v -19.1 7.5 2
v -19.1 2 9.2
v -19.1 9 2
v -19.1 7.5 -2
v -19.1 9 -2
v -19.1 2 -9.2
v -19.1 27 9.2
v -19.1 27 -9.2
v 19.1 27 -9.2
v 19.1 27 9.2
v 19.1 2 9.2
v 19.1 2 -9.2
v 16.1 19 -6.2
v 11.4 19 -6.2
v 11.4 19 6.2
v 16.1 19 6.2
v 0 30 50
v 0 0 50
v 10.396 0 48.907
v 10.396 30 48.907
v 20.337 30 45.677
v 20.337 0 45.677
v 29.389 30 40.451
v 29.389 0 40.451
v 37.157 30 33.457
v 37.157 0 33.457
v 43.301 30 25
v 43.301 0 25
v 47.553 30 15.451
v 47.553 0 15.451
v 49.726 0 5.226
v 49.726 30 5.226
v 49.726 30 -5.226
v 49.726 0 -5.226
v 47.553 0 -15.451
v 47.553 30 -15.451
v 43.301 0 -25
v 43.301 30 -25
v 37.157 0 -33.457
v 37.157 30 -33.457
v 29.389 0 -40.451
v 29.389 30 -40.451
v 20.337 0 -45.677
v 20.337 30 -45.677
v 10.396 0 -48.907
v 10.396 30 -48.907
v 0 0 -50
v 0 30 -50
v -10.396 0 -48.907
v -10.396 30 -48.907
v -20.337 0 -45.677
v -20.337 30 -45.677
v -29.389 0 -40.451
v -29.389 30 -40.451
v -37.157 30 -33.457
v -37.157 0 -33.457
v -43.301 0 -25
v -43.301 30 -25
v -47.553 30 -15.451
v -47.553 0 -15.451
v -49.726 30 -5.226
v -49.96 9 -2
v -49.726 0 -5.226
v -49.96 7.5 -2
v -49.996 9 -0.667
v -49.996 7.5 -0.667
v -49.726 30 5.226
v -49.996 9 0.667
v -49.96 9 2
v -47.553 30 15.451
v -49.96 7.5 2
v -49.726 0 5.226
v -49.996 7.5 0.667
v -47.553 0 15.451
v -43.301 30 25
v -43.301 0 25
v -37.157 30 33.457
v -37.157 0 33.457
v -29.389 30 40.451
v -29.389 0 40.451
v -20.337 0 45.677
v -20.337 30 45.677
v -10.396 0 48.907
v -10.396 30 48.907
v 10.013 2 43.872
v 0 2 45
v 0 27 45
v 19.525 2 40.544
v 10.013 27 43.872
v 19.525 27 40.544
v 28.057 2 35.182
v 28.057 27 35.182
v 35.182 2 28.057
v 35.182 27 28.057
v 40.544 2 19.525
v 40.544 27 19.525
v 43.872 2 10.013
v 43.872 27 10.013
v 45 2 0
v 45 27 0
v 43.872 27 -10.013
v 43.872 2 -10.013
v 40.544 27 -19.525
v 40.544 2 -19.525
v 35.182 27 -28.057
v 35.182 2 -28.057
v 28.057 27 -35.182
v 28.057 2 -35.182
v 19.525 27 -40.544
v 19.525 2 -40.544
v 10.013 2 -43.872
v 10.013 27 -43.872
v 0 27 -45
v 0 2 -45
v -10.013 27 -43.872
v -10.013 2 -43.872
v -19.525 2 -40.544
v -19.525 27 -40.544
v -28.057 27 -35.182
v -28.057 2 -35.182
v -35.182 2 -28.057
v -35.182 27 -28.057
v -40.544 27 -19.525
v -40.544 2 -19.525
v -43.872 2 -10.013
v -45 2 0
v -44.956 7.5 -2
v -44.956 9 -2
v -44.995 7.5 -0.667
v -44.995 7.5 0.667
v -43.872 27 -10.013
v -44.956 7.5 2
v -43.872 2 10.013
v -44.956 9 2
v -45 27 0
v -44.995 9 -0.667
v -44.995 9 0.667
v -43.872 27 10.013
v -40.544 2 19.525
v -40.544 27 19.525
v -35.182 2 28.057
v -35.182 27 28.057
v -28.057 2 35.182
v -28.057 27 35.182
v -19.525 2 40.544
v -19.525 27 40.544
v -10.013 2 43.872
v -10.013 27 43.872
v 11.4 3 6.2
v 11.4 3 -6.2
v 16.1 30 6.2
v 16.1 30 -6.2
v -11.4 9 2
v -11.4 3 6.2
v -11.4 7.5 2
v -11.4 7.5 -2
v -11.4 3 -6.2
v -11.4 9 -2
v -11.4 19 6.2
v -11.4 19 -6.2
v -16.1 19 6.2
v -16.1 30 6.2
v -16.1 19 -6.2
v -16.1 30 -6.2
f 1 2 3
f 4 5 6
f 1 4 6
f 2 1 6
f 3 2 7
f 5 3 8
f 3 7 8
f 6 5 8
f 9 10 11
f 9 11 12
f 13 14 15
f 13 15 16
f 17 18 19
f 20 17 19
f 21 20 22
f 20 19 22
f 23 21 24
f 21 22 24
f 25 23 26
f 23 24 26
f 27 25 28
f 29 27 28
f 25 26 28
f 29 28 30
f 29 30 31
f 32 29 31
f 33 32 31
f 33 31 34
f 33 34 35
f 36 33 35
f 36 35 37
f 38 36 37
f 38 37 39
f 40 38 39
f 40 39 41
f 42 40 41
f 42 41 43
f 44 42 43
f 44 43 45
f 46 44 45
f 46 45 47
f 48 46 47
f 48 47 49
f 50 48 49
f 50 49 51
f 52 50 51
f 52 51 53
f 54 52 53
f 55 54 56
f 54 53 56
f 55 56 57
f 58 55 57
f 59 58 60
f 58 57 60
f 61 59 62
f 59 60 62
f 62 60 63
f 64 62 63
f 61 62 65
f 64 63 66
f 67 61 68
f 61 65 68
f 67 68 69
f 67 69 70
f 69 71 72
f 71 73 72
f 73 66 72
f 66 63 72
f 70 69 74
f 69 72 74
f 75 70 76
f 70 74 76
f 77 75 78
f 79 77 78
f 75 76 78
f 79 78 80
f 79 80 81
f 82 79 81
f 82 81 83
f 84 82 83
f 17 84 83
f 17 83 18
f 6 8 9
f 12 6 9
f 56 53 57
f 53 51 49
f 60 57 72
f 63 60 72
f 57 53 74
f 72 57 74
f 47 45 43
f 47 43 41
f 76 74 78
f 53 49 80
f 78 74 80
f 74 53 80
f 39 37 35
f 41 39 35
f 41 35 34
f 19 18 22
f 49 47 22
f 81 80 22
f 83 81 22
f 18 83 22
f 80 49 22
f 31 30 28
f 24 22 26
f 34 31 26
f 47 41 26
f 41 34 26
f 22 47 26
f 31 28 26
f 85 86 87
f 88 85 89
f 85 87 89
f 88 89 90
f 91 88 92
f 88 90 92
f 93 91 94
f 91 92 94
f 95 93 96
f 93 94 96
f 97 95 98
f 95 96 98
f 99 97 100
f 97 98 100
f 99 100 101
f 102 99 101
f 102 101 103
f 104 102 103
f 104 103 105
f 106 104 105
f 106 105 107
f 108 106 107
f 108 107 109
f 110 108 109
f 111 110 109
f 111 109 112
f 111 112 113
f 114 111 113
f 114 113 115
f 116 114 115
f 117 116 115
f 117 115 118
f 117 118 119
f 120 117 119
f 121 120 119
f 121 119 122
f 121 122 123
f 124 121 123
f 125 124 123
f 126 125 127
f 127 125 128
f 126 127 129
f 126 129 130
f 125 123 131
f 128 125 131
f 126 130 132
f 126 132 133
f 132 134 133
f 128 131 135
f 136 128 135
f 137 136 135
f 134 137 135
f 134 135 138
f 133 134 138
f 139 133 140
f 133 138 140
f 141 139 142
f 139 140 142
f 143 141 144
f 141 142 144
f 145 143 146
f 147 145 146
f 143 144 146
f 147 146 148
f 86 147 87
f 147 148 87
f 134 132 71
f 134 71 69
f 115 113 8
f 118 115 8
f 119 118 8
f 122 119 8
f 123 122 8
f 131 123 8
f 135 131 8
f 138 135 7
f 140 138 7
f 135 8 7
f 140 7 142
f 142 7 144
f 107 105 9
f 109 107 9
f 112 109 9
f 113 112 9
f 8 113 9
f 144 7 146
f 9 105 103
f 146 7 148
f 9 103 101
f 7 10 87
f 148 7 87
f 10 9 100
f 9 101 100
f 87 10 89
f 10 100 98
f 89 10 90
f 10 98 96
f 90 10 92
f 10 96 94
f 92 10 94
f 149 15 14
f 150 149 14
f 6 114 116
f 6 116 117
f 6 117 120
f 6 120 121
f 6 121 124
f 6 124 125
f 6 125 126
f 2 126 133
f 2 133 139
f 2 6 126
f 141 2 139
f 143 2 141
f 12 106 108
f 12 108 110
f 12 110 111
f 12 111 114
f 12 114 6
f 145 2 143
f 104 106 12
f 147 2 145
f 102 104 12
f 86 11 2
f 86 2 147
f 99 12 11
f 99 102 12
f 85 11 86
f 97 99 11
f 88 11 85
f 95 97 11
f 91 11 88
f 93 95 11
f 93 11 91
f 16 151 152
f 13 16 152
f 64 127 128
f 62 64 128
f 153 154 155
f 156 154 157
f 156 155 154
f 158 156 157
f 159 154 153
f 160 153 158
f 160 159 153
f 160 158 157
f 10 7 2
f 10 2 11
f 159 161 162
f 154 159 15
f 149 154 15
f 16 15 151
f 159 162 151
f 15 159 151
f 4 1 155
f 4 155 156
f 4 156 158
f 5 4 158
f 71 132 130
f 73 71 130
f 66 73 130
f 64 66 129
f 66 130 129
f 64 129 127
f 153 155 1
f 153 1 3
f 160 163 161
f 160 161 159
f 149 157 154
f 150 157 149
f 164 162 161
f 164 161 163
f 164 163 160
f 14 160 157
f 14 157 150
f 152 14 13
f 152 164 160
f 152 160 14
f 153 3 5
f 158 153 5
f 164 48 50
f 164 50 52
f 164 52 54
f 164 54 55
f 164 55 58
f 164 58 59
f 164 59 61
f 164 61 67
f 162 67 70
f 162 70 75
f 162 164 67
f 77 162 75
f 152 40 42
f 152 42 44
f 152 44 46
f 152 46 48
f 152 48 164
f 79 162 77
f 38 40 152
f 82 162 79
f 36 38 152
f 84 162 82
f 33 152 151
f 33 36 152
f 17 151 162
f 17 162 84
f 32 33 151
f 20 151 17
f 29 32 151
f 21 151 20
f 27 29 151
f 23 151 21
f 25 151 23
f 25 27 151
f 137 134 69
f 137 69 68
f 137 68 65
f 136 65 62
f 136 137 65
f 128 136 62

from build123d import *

# Parameters (mm, degrees)
SKETCH1_R           = 50
BOSS_EXTRUDE1_DEPTH = 30
SKETCH2_W           = 22.8
SKETCH2_H           = 12.4
CUT_EXTRUDE1_DEPTH  = 27
SKETCH3_W           = 4
SKETCH3_H           = 1.5
CUT_EXTRUDE2_DEPTH  = 77.811457479
SKETCH4_W           = 32.2
SKETCH4_H           = 12.4
CUT_EXTRUDE3_DEPTH  = 11
CUT_EXTRUDE6_START  = -3
SKETCH5_W           = 58.2
SKETCH5_H           = 48.4
SKETCH5_W_2         = 38.2
SKETCH5_H_2         = 18.4
CUT_EXTRUDE6_DEPTH  = 25
CUT_EXTRUDE9_START  = -3
SKETCH6_R           = 45
SKETCH6_R_2         = 22.113575547
CUT_EXTRUDE9_DEPTH  = 25


with BuildPart() as part:
    # Sketch1 → Boss-Extrude1 (new body)
    with BuildSketch(Plane(origin=(0, 0, 0), x_dir=(1, 0, 0), z_dir=(0, 1, 0))):
        with Locations(Location((0, 0, 0), (0, 0, 270))):
            Circle(SKETCH1_R)
    extrude(amount=BOSS_EXTRUDE1_DEPTH)

    # Sketch2 → Cut-Extrude1 (cut)
    with BuildSketch(Plane(origin=(0, 30, 0), x_dir=(1, 0, 0), z_dir=(0, 1, 0))):
        Rectangle(SKETCH2_W, SKETCH2_H)
    extrude(amount=-CUT_EXTRUDE1_DEPTH, mode=Mode.SUBTRACT)

    # Sketch3 → Cut-Extrude2 (cut, through all)
    with BuildSketch(Plane(origin=(0, 0, 0), x_dir=(0, 0, -1), z_dir=(1, 0, 0))):
        with Locations((0, 8.25)):
            Rectangle(SKETCH3_W, SKETCH3_H)
    extrude(amount=-CUT_EXTRUDE2_DEPTH, mode=Mode.SUBTRACT)

    # Sketch4 → Cut-Extrude3 (cut)
    with BuildSketch(Plane(origin=(0, 30, 0), x_dir=(1, 0, 0), z_dir=(0, 1, 0))):
        Rectangle(SKETCH4_W, SKETCH4_H)
    extrude(amount=-CUT_EXTRUDE3_DEPTH, mode=Mode.SUBTRACT)

    # Sketch5 → Cut-Extrude6 (cut)
    with BuildSketch(Plane(origin=(0, 30, 0), x_dir=(1, 0, 0), z_dir=(0, 1, 0)).offset(CUT_EXTRUDE6_START)):
        Rectangle(SKETCH5_W, SKETCH5_H)
        Rectangle(SKETCH5_W_2, SKETCH5_H_2, mode=Mode.SUBTRACT)
    extrude(amount=-CUT_EXTRUDE6_DEPTH, mode=Mode.SUBTRACT)

    # Sketch6 → Cut-Extrude9 (cut)
    with BuildSketch(Plane(origin=(0, 30, 0), x_dir=(1, 0, 0), z_dir=(0, 1, 0)).offset(CUT_EXTRUDE9_START)):
        with Locations(Location((0, 0, 0), (0, 0, 270))):
            Circle(SKETCH6_R)
        Circle(SKETCH6_R_2, mode=Mode.SUBTRACT)
    extrude(amount=-CUT_EXTRUDE9_DEPTH, mode=Mode.SUBTRACT)


solid = part.part
